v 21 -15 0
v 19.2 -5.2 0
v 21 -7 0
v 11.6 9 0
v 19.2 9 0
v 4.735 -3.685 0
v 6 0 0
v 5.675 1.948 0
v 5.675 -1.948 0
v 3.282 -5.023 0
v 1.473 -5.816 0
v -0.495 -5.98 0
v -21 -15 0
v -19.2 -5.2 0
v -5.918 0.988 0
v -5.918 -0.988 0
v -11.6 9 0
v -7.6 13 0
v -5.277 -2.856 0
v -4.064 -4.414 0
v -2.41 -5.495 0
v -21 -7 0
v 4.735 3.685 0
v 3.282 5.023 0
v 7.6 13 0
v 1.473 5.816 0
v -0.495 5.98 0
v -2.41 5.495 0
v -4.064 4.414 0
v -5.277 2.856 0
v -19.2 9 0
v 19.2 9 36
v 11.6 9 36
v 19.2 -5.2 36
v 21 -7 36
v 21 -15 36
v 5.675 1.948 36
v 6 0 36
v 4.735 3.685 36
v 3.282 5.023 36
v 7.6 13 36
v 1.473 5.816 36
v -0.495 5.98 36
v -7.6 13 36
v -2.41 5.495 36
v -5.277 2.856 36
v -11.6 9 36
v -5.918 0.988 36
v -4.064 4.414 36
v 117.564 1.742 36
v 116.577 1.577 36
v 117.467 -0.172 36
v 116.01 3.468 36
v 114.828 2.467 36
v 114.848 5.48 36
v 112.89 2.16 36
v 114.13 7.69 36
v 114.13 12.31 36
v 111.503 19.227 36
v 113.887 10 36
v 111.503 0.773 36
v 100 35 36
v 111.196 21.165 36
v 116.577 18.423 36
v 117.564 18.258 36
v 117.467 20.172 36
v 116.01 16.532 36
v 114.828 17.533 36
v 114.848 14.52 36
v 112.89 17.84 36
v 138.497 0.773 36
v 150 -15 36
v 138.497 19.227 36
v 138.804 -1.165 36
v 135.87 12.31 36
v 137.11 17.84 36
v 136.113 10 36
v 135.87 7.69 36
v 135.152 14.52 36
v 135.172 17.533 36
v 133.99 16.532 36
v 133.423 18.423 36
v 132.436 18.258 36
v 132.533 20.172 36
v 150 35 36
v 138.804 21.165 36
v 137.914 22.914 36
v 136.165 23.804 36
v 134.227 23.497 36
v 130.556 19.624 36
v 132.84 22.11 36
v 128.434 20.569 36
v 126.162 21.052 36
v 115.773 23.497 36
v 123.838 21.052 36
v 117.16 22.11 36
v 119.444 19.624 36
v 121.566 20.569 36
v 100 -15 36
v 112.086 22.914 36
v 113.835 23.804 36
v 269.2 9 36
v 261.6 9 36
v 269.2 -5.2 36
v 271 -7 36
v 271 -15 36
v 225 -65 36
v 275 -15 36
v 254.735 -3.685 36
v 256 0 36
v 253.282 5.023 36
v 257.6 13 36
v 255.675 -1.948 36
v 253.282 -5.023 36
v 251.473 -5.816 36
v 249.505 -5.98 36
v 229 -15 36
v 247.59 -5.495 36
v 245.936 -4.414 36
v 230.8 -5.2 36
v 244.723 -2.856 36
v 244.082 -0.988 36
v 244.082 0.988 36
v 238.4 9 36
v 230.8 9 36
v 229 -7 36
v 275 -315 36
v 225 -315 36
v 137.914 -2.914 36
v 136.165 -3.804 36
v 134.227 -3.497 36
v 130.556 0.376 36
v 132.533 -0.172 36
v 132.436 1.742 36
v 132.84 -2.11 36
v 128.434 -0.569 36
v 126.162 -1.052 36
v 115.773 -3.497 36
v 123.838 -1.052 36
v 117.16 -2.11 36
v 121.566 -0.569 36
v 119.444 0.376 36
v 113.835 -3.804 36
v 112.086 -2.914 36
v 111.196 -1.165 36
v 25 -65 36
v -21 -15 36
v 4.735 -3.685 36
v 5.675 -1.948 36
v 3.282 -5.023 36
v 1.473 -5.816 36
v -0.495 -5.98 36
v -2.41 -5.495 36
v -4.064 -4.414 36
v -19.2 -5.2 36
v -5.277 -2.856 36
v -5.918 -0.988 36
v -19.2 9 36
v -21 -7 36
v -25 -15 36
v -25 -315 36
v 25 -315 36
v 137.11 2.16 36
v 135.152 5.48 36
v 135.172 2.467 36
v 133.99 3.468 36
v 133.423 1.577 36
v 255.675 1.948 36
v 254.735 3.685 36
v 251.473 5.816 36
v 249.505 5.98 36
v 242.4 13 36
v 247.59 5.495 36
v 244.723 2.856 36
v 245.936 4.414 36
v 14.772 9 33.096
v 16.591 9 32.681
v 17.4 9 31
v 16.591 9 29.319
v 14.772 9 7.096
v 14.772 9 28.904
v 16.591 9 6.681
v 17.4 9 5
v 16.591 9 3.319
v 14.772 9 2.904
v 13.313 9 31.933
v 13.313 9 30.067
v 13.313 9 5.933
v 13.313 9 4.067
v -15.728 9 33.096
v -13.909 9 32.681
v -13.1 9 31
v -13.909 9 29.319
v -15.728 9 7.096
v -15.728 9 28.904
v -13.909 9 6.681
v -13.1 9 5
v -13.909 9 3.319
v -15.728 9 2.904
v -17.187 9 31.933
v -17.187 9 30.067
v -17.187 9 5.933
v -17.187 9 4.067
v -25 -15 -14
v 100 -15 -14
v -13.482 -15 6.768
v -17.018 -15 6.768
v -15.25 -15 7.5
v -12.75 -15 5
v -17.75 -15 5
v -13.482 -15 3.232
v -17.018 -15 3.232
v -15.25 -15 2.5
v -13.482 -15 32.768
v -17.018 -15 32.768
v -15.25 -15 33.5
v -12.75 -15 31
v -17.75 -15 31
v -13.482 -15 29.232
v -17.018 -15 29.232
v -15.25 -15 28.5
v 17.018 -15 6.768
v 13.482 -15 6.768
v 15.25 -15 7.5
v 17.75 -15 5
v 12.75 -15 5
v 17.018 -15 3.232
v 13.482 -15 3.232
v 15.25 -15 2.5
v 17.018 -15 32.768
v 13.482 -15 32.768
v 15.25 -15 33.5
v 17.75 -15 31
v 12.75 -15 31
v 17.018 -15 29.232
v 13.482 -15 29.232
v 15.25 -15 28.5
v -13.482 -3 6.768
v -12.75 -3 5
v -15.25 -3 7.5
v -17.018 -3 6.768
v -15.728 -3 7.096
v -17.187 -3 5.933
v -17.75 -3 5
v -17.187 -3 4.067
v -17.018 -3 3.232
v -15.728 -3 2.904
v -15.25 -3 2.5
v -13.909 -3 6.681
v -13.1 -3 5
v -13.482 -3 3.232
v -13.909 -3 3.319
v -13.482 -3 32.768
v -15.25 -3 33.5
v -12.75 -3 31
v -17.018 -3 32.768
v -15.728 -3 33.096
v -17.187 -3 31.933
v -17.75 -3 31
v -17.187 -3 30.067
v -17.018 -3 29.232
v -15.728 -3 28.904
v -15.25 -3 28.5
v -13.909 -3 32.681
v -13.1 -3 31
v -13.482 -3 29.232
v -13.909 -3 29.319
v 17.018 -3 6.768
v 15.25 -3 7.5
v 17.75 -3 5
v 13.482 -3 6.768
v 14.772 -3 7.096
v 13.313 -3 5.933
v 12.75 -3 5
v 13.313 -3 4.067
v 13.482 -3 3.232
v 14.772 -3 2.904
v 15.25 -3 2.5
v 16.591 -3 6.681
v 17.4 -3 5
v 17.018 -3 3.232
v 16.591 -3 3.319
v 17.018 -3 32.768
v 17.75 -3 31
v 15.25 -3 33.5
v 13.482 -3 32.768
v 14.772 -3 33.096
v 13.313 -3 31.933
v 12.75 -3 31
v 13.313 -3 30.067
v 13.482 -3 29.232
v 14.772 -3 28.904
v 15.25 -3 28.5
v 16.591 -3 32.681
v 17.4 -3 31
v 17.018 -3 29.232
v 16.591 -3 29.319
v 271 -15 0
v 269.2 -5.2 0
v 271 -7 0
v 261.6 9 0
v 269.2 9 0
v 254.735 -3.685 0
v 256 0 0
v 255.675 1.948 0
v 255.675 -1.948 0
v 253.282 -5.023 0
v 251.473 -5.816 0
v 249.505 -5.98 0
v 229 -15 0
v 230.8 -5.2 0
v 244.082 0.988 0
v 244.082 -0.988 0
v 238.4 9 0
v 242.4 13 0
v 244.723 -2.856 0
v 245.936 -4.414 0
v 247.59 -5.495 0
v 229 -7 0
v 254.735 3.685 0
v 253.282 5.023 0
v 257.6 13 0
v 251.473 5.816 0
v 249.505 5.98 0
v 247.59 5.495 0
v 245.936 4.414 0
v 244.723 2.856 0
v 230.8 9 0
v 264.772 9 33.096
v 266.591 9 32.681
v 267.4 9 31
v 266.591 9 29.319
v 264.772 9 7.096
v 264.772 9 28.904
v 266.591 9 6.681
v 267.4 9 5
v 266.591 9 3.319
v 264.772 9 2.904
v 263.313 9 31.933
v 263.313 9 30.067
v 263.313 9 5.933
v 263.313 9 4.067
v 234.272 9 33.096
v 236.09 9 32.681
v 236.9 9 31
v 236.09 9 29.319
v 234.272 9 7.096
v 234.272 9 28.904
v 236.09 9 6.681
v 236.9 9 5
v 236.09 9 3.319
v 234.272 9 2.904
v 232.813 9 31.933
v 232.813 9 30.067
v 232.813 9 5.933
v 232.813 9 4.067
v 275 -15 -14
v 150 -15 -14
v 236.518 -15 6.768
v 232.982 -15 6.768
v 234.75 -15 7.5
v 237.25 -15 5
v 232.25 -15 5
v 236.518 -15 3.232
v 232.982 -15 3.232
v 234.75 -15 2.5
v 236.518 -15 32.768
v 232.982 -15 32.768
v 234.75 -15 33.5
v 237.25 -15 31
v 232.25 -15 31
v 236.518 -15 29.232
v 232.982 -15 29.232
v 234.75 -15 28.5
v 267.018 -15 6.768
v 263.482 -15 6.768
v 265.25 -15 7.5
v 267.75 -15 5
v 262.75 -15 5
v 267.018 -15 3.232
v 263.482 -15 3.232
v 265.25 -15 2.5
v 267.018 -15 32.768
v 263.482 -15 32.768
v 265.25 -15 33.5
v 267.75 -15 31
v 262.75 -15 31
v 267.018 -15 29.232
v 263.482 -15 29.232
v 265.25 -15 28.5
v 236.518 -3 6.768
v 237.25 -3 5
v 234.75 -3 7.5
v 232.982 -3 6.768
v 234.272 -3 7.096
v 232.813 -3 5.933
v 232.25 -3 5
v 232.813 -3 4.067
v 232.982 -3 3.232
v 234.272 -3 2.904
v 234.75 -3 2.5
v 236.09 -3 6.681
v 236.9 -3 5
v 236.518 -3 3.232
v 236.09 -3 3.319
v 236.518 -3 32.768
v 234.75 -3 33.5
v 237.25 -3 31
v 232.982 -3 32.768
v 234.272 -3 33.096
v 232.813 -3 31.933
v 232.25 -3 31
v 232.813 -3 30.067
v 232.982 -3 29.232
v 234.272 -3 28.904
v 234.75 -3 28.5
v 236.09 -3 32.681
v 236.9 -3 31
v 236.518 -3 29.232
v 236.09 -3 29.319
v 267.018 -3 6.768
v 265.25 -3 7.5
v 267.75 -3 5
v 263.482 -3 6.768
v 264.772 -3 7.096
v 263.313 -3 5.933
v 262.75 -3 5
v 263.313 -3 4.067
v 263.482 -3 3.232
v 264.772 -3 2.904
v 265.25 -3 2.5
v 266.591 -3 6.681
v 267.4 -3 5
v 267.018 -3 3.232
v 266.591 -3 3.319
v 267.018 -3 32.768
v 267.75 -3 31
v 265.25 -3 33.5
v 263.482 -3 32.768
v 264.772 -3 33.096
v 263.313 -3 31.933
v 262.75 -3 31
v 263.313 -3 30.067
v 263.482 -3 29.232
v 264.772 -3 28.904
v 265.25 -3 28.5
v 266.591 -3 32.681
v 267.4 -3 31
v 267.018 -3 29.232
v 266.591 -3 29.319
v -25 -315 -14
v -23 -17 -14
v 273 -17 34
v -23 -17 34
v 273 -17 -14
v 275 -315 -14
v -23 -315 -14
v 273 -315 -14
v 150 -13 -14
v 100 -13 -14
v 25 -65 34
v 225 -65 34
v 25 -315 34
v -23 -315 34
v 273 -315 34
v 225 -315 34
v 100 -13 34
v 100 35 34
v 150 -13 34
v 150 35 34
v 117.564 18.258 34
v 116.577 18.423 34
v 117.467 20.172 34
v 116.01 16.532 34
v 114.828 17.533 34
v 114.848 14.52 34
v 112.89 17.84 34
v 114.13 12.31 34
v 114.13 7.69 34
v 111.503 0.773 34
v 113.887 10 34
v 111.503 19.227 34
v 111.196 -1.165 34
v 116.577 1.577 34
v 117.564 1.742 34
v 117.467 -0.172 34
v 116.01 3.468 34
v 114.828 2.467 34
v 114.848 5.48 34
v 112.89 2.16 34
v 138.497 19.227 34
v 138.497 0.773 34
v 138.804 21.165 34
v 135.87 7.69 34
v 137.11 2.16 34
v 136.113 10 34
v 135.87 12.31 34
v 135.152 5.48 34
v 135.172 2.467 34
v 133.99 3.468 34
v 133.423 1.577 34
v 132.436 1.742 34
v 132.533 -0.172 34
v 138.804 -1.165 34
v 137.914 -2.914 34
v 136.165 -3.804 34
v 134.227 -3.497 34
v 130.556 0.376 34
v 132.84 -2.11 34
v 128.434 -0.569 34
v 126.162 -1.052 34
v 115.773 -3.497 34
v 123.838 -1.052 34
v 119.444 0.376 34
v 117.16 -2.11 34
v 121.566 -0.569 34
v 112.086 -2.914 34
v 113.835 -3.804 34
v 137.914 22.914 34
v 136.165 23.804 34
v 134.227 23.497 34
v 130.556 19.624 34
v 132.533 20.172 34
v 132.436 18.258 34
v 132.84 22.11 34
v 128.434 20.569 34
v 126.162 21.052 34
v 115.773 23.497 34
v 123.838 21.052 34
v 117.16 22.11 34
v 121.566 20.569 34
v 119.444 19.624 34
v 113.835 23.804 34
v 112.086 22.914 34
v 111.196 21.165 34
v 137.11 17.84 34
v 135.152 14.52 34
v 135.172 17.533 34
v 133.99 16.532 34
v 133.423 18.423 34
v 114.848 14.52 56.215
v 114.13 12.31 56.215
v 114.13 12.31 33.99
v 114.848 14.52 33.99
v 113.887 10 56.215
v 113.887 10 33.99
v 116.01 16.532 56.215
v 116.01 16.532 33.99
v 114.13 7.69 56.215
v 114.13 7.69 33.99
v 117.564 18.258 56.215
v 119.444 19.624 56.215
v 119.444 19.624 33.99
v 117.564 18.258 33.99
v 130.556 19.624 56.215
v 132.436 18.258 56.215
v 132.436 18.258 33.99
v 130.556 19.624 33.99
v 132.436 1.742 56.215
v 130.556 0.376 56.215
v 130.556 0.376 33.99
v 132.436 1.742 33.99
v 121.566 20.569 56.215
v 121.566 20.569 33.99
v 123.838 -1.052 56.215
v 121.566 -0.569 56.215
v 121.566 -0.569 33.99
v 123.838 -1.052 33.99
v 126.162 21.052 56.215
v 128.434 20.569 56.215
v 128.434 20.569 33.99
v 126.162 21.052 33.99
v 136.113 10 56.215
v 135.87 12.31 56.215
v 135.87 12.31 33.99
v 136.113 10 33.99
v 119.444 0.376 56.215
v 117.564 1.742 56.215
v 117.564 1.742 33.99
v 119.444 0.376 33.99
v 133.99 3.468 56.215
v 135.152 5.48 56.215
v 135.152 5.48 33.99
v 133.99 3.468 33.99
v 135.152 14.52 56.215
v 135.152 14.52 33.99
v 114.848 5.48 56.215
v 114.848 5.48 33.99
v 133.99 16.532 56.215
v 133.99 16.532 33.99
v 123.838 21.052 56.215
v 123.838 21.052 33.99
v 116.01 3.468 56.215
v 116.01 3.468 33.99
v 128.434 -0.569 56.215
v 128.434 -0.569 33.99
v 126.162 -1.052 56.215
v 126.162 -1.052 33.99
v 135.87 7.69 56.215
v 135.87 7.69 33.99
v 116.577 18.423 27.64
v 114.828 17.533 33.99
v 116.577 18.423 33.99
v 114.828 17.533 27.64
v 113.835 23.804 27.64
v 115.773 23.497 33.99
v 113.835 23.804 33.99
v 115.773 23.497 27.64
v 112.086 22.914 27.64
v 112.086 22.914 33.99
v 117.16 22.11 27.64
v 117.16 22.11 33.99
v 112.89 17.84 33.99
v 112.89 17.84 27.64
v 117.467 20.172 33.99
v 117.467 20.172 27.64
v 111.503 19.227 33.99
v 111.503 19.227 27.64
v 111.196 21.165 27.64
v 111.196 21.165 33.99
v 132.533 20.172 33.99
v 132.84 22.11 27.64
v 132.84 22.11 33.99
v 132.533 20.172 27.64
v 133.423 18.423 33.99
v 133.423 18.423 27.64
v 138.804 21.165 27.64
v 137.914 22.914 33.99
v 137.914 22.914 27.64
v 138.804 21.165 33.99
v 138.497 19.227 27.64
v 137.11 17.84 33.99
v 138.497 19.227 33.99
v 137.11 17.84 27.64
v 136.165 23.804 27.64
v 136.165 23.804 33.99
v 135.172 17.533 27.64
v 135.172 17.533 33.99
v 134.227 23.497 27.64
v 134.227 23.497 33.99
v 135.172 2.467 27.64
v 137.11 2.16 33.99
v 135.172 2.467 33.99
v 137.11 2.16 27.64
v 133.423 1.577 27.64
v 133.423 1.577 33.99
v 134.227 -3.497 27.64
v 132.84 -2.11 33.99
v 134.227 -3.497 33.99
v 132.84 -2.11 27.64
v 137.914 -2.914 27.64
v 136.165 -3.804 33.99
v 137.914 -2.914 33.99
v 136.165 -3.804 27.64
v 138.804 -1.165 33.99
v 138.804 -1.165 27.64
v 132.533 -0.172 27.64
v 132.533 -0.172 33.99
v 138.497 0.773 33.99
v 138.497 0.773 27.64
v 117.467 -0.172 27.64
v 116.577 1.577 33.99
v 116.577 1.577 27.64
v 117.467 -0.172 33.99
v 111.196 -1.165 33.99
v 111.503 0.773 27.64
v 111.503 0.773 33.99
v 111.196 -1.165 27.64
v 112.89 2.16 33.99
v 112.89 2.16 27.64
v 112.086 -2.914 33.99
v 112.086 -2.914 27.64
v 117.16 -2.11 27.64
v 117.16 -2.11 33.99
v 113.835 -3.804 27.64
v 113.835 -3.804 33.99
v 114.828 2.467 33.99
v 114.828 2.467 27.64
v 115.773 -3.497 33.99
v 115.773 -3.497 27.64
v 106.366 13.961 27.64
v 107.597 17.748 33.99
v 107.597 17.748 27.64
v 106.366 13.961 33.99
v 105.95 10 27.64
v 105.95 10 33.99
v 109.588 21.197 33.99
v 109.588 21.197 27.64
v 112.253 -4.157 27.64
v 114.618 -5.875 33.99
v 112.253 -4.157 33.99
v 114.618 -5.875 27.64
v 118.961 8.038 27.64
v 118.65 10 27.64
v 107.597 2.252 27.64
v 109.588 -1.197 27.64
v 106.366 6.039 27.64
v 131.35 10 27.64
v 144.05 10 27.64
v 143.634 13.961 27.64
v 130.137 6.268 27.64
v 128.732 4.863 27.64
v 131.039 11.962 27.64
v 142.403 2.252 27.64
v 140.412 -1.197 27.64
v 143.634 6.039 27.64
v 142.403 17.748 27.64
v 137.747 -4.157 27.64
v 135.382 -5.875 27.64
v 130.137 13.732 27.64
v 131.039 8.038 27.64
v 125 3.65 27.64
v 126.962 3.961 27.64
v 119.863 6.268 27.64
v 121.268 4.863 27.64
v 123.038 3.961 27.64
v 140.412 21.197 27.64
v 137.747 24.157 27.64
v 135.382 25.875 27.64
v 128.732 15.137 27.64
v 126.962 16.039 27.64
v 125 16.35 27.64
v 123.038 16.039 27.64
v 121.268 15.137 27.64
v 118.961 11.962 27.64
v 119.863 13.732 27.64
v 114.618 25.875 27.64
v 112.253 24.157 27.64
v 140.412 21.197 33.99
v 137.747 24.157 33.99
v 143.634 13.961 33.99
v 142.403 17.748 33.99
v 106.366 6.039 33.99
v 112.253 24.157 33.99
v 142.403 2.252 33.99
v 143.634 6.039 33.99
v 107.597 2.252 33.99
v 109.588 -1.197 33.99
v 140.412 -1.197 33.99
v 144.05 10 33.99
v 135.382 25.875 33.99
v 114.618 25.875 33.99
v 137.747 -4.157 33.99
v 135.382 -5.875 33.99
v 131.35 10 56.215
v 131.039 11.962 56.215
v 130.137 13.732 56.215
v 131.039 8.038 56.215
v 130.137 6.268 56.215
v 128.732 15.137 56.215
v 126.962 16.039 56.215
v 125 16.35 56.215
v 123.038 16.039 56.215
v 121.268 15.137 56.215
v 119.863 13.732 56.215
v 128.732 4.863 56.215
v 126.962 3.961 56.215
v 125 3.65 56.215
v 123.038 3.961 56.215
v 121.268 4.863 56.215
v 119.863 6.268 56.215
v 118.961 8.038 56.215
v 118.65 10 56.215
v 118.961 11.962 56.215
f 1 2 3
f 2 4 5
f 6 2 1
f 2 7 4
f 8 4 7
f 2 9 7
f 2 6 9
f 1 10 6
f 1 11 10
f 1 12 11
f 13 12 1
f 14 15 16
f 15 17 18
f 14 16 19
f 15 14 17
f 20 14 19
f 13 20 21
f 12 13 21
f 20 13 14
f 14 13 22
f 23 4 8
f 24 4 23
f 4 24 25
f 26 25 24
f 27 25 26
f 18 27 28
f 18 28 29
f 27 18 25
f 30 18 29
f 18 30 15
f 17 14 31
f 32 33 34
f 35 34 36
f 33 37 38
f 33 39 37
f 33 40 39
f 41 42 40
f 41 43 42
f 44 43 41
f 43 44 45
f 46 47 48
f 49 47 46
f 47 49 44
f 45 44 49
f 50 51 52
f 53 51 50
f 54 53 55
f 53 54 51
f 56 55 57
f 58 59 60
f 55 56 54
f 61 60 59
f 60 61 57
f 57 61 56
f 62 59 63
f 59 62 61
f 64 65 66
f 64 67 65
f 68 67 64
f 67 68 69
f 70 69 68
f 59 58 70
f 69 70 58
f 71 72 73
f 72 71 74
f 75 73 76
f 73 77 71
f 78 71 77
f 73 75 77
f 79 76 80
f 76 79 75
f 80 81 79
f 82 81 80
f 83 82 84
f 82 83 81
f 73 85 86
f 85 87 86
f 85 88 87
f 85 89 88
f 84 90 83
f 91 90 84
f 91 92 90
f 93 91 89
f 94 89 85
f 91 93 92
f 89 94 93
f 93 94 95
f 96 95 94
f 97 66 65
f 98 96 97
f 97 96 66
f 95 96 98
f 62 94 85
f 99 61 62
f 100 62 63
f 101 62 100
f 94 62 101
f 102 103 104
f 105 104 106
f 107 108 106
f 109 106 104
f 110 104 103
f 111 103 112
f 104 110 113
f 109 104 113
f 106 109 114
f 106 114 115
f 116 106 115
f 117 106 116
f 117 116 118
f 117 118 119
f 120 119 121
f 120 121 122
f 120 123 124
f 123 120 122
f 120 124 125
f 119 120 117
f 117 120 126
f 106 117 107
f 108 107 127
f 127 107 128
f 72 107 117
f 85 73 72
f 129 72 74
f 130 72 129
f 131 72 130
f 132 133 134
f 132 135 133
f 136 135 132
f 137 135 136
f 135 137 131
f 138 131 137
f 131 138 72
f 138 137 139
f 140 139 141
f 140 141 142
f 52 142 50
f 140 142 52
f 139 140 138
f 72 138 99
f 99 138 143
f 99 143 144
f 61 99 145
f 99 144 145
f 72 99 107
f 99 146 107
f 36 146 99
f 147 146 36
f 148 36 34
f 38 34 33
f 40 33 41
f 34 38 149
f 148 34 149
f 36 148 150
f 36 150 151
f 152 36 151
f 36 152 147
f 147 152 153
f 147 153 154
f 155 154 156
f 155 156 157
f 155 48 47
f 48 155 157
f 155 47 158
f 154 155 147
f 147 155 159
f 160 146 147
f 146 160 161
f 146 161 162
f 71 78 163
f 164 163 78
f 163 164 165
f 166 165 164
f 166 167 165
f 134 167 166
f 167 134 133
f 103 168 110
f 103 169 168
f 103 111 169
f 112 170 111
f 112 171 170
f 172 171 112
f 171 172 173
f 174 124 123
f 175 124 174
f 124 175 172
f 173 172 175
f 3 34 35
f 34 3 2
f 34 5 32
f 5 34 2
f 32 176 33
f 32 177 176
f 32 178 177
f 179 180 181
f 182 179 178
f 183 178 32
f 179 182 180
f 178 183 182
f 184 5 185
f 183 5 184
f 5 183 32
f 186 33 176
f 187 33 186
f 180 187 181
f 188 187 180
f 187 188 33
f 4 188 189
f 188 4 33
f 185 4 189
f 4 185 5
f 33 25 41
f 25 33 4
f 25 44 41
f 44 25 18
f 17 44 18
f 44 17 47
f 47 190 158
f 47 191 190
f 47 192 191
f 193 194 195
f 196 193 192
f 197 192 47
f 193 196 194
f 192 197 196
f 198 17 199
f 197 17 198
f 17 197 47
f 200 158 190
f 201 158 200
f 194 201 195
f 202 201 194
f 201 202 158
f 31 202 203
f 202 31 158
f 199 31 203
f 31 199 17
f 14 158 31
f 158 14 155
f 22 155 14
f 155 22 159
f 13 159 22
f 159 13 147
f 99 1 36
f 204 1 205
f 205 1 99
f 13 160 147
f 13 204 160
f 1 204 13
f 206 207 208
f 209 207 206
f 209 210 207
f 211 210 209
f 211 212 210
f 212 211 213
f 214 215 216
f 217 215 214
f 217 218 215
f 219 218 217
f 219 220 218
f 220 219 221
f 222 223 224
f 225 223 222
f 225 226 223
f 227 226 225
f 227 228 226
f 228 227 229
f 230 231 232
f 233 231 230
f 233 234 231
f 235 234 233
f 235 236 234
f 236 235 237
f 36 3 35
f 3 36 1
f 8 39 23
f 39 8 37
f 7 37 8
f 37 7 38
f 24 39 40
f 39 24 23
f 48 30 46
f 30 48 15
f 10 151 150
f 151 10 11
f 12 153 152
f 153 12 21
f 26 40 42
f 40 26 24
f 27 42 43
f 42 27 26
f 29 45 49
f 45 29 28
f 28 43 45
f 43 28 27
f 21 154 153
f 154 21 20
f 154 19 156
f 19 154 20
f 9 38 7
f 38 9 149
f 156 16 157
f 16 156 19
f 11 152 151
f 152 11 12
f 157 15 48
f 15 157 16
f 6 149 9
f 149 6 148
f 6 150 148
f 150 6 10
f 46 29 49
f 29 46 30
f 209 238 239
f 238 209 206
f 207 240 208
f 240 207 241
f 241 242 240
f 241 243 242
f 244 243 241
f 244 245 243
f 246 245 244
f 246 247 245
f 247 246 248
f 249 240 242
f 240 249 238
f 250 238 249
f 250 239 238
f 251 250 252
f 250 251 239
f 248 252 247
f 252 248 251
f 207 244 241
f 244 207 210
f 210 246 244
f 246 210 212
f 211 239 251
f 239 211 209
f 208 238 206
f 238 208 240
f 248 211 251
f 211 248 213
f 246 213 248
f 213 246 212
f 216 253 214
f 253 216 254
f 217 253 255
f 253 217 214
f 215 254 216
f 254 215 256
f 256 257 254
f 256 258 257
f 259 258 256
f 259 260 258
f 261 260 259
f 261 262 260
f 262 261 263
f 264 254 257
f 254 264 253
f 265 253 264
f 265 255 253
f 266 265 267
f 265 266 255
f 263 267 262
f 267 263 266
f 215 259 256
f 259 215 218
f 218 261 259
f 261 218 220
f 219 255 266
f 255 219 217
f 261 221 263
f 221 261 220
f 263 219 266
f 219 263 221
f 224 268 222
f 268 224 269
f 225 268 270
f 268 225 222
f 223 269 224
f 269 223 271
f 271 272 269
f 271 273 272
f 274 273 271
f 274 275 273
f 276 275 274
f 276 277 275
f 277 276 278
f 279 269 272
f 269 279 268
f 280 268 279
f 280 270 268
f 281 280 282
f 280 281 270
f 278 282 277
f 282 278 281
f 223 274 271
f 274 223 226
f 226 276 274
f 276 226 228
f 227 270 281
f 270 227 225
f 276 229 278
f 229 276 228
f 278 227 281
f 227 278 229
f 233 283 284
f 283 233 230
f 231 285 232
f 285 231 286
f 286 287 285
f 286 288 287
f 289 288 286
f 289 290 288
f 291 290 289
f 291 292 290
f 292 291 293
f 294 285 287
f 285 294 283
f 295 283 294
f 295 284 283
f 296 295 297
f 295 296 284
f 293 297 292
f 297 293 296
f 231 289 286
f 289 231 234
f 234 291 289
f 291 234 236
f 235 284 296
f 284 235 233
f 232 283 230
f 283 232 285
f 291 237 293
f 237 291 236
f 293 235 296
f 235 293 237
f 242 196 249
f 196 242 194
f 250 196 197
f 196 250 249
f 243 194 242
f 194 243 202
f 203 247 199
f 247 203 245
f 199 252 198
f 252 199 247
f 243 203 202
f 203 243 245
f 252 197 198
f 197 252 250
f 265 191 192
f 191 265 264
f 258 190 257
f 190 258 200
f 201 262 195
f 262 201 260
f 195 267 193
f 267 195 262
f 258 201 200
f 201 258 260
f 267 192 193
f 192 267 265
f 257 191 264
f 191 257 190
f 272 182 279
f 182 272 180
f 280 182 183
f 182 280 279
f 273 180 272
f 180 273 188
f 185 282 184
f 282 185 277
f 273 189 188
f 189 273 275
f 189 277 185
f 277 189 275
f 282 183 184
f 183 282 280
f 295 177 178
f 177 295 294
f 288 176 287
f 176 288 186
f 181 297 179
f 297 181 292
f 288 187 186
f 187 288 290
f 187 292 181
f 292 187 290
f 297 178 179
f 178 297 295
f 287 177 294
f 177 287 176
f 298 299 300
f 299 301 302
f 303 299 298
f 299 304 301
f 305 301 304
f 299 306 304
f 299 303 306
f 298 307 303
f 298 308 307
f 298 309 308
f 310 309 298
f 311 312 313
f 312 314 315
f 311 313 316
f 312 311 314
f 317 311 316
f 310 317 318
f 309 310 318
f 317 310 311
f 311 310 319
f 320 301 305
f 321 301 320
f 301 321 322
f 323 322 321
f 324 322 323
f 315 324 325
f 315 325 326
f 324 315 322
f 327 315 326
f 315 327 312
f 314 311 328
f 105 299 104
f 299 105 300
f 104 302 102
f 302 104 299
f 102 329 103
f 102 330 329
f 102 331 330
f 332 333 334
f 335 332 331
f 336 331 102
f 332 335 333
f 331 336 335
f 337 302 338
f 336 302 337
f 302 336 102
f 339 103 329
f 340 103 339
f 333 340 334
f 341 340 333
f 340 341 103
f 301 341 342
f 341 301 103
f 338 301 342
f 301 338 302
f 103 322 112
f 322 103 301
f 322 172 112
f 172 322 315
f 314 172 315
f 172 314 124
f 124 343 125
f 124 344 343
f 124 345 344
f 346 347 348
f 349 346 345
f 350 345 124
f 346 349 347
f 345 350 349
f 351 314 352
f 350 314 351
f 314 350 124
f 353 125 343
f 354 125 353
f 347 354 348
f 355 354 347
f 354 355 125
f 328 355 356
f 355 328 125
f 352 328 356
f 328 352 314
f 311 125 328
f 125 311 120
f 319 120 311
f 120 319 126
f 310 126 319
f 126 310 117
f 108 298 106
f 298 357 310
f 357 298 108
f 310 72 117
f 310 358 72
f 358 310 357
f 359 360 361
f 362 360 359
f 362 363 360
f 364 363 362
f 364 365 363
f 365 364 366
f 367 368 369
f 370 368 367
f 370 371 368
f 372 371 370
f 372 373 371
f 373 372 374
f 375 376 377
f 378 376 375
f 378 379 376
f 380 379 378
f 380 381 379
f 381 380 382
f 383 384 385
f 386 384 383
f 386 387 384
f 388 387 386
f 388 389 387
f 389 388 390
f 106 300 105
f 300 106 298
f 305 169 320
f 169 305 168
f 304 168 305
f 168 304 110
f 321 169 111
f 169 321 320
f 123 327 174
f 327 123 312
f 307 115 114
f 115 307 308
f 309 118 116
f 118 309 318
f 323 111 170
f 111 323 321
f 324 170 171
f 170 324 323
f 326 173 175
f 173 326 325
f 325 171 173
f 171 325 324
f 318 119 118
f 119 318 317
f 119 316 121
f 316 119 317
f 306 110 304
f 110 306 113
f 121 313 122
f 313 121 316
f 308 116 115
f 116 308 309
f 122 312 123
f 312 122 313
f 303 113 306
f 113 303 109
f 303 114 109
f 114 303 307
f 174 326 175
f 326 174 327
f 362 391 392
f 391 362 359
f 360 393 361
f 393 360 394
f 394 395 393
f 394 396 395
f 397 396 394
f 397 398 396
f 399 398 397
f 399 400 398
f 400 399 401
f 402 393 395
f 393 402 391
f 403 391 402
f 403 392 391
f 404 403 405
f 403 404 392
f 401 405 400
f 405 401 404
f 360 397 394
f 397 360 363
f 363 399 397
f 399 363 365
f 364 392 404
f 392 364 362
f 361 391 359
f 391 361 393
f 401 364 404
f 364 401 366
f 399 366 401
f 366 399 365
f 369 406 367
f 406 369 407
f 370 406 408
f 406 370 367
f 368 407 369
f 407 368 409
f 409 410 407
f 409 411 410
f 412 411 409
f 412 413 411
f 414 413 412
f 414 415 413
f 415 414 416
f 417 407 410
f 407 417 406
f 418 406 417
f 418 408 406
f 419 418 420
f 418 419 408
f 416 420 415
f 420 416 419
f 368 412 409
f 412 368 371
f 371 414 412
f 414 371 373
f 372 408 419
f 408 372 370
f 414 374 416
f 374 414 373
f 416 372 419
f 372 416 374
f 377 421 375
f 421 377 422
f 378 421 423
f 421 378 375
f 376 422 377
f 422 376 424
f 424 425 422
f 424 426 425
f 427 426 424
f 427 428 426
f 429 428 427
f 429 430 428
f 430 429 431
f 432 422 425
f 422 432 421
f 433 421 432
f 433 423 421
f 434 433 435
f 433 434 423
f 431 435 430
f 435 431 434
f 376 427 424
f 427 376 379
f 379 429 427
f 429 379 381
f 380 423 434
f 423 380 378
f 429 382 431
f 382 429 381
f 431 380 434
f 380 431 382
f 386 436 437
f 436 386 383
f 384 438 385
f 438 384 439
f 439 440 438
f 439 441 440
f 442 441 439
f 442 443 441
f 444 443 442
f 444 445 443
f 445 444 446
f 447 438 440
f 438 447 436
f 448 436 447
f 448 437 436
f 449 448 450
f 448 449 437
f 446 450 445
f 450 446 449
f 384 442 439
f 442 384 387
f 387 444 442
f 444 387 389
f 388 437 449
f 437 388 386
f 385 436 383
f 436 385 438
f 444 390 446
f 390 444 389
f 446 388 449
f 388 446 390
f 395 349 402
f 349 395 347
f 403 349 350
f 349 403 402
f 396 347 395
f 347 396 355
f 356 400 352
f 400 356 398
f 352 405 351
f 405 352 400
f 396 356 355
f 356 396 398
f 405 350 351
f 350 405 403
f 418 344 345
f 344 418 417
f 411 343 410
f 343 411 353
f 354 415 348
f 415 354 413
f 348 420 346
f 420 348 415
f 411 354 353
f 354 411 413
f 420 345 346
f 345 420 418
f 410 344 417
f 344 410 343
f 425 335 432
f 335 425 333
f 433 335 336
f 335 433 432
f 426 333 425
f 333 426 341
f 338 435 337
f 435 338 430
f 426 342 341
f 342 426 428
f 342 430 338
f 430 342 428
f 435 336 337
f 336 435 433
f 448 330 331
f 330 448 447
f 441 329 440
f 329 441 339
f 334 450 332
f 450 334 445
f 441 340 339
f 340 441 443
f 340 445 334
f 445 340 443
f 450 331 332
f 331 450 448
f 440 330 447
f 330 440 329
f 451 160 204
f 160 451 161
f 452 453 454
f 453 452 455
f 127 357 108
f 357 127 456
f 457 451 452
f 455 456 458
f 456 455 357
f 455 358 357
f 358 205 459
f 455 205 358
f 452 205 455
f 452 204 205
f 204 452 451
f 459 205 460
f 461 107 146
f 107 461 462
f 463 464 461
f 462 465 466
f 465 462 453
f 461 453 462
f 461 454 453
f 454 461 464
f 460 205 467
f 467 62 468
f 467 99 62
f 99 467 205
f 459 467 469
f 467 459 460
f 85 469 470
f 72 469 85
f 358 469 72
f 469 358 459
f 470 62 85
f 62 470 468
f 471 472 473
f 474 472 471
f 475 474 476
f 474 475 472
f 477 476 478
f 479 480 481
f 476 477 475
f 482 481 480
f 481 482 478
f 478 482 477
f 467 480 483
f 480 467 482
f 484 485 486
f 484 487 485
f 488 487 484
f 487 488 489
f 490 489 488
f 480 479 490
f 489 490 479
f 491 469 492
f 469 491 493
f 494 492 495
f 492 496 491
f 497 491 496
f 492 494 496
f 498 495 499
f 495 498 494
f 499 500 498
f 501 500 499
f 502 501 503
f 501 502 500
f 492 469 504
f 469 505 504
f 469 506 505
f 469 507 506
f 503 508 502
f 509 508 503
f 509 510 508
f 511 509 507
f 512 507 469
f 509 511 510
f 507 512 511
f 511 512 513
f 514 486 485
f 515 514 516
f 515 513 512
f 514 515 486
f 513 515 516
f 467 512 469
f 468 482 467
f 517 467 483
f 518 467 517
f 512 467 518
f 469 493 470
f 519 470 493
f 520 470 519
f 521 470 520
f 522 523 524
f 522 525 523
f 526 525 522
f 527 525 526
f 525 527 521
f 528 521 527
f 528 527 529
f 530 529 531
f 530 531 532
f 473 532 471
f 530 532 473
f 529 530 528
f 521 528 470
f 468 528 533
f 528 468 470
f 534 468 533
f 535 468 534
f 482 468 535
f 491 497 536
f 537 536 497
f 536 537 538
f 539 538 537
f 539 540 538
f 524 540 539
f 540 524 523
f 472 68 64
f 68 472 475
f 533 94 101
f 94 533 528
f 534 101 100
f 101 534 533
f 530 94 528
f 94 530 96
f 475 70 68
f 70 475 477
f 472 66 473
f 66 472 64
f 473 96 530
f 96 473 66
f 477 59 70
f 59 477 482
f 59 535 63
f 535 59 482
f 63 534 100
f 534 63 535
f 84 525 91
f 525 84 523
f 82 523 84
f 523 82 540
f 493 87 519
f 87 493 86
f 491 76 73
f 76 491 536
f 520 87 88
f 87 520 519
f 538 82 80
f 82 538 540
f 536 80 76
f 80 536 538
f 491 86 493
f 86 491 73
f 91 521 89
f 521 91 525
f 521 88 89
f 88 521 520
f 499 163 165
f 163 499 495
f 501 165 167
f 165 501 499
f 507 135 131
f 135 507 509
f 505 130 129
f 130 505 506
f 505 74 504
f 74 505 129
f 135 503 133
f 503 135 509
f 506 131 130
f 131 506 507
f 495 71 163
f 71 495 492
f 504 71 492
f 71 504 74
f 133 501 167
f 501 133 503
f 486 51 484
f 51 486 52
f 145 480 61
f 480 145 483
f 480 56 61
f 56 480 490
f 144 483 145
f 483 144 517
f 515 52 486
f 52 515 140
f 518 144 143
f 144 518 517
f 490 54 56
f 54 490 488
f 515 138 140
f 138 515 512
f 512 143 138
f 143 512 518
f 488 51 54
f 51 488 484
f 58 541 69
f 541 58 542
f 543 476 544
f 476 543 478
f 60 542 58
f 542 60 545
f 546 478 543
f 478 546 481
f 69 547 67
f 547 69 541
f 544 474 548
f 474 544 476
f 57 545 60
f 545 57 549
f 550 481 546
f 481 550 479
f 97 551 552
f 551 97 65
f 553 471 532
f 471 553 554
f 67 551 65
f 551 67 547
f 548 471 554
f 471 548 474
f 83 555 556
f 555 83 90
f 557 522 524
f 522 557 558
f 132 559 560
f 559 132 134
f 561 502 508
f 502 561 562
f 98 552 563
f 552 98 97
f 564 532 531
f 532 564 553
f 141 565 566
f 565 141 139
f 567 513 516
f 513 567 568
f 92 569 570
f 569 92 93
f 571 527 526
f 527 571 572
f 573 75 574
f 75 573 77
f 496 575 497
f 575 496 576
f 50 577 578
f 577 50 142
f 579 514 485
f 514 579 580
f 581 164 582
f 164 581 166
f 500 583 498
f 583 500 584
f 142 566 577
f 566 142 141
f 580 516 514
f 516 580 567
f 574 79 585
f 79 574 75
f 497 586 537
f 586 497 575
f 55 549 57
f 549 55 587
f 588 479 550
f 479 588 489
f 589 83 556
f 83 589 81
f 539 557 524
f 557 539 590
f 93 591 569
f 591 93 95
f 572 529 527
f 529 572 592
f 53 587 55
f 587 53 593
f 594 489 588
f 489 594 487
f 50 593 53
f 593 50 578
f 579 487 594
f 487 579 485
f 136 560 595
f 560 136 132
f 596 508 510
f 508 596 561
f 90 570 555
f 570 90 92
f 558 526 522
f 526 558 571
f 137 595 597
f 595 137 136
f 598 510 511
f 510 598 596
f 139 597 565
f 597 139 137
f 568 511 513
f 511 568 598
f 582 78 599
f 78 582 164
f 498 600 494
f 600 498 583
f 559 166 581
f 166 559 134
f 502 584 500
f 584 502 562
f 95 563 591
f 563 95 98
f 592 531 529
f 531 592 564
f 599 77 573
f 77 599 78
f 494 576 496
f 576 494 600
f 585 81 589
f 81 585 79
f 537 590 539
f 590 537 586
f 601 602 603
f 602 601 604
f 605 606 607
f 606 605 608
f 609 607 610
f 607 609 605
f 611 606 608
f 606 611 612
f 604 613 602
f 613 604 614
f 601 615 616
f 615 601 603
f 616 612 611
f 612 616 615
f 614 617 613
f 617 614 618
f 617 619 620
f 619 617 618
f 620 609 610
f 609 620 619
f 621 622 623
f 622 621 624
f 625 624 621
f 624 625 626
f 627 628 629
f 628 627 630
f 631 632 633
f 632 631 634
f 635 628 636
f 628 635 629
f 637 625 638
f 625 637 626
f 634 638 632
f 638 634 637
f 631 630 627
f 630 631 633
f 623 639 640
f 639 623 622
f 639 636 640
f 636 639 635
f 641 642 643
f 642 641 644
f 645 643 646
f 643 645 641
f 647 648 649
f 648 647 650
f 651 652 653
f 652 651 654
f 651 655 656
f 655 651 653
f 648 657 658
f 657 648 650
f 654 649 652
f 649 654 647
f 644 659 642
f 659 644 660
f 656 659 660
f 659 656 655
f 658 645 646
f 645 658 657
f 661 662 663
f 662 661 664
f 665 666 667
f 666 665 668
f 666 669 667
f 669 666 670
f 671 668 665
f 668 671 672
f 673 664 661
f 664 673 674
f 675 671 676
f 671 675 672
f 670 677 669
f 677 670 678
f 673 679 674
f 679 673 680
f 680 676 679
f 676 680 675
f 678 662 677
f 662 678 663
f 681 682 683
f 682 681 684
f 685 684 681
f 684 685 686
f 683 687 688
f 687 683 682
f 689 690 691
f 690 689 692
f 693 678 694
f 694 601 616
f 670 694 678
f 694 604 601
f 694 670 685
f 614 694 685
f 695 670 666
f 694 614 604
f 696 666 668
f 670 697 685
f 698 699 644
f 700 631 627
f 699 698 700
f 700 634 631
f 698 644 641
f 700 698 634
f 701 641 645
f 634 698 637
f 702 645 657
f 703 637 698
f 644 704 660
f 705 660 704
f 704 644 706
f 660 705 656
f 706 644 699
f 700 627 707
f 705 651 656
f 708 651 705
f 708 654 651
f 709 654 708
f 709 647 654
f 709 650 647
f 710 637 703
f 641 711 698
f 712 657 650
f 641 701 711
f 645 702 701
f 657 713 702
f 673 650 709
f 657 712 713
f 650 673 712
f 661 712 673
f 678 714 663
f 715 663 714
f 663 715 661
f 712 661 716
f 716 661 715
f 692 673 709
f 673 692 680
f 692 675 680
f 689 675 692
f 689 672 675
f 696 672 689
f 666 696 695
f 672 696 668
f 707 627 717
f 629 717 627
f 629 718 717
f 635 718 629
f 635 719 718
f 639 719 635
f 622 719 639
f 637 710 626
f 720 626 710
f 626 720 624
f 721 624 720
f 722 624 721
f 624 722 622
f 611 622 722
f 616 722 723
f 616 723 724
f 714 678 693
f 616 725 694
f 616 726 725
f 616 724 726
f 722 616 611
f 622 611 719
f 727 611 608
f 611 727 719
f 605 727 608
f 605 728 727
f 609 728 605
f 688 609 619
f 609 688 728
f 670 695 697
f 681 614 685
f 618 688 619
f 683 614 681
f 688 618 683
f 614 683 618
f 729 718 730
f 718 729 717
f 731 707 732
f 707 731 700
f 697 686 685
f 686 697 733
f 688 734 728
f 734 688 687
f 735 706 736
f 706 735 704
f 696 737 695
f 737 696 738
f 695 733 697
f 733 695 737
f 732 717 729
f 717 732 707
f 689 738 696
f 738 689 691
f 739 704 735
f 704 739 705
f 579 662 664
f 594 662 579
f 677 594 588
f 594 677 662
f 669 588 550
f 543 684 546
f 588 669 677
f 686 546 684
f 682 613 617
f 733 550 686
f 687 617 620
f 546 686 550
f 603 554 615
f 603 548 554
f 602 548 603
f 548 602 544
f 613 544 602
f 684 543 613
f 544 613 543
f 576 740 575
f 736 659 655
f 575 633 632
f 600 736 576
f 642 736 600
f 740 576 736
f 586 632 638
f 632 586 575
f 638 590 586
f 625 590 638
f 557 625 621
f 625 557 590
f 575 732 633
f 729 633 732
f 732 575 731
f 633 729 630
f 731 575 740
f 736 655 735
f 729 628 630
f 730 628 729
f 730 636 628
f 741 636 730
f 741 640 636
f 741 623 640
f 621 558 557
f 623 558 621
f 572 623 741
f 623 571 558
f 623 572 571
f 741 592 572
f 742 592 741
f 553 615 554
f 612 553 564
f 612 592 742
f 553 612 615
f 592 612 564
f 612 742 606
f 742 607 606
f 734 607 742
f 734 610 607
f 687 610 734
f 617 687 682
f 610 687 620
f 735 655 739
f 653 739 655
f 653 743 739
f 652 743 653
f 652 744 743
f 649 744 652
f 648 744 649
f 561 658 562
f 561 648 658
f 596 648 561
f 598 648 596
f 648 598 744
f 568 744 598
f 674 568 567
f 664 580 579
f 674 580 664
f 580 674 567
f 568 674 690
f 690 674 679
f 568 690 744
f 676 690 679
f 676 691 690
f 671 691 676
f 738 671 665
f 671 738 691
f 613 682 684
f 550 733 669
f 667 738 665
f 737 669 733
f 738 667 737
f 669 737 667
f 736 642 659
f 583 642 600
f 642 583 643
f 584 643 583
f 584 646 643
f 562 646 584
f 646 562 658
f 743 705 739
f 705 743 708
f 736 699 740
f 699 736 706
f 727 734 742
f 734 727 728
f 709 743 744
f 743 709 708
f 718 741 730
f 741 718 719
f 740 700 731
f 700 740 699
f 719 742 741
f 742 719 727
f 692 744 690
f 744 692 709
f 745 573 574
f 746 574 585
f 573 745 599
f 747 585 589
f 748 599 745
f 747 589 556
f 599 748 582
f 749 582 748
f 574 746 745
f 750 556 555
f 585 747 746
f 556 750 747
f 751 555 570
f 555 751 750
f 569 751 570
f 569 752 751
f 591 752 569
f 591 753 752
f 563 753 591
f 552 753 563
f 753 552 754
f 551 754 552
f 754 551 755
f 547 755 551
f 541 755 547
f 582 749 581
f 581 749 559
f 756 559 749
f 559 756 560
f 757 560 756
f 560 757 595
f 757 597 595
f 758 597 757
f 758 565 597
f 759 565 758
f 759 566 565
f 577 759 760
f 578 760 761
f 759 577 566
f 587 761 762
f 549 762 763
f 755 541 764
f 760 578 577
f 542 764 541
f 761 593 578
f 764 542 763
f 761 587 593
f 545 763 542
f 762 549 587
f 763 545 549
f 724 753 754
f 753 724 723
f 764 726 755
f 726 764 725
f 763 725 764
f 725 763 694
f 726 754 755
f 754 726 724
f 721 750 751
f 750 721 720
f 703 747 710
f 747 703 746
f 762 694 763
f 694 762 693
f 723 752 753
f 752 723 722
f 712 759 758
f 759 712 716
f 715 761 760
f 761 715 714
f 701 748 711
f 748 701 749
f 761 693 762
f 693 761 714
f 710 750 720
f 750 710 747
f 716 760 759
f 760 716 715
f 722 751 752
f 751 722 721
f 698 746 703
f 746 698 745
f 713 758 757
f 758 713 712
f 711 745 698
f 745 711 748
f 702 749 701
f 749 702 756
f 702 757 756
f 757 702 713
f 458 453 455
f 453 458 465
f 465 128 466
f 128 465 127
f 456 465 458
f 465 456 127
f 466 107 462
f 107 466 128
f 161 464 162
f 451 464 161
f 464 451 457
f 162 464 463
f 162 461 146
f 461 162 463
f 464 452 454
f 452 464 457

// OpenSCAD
// file: bearing_dims.scad
/*
	bore = v[0];
	outer = v[1];
	len = v[2];
	ring_space = v[3];
	ring_dia = v[4];
	ring_gap = v[5];
*/

linear_bearing_dims = [
	[3,7,10,0,7,0],
	[4,8,12,0,8,0],
	[5,10,15,10.2,9.6,1.1],
	[6,12,19,13.5,11.5,1.1],
	[8,15,24,17.5,14.3,1.1],
	[10,19,29,22,18,1.3],
	[12,21,30,23,20,1.3],
	[13,23,32,23,22,1.3],
	[16,28,37,26.5,27,1.6],
	[20,32,42,30.5,30.5,1.6],
	[25,40,59,41,38,1.85],
	[30,45,64,44.5,43,1.85],
	[35,52,70,49.5,49,2.1],
	[40,60,80,60.5,57,2.1],
	[50,80,100,74,76.5,2.6],
	[60,90,110,85,86.5,3.15],
	[80,120,140,105.5,116,4.15],
	[100,150,150,125.5,145,4.15]
];

/*
	d = v[0];
	h = v[1];
	e = v[2];
	w = v[3];		// overall width
	l = v[4];		// overall length
	f = v[5];
	g = v[6];
	b = v[7];		// screw spacing along width
	c = v[8];		// screw spacing along length
	k = v[9];
	t = v[10];
	s1 = v[11];
	s2 = v[12];
	L1 = v[13];
*/

linear_bearing_block_dims = [
	[6,9,15,30,25,18,15,20,15,5,6,4,3.4,8],
	[8,11,17,34,30,22,18,24,18,5,6,4,3.4,8],
	[10,13,20,40,35,26,21,28,21,6,8,5,4.3,12],
	[12,15,21,42,36,28,24,30.5,26,5.75,8,5,4.3,12],
	[13,15,22,44,39,30,24.5,33,26,5.5,8,5,4.3,12],
	[16,19,25,50,44,38.5,32.5,36,34,7,9,5,4.3,12],
	[20,21,27,54,50,41,35,40,40,7,11,6,5.2,12],
	[25,26,38,76,67,51.5,42,54,50,11,12,8,7,18],
	[30,30,39,78,72,59.5,49,58,58,10,15,8,7,18],
	[35,34,45,90,80,68,54,70,60,10,18,8,7,18],
	[40,40,51,102,90,78,62,80,60,11,20,10,8.7,25],
	[50,52,61,122,110,102,80,100,80,11,25,10,8.7,25],
	[60,58,66,132,122,114,94,108,90,12,30,10,10.7,25]
];

linear_bearing_long_block_dims = [
	[8,11,17,34,59,22,18,24,42,5,6,4,3.4,8],
	[10,13,20,40,68,26,21,28,46,6,8,5,4.3,12],
	[12,15,21,42,70,28,24,30.5,50,5.75,8,5,4.3,12],
	[13,15,22,44,75,30,24.5,33,50,5.5,8,5,4.3,12],
	[16,19,25,50,85,38.5,32.5,36,60,7,9,5,4.3,12],
	[20,21,27,54,96,41,35,40,70,7,11,6,5.2,12],
	[25,26,38,76,130,51.5,42,54,100,11,12,8,7,18],
	[30,30,39,78,140,59.5,49,58,110,10,15,8,7,18],
	[35,34,45,90,155,68,54,70,120,10,18,8,7,18],
	[40,40,51,102,175,78,62,80,140,11,20,10,8.7,25],
];

/*
	d = v[0];
	D = v[1];
	L = v[2];
	D1 = v[3];
	H = v[4];
	pcd = v[5];
	d1 = v[6];
	d2 = v[7];
	h = v[8];
*/

linear_bearing_round_flange_dims = [
	[6,12,19,28,5,20,3.4,6.5,3.3],
	[8,15,24,32,5,24,3.4,6.5,3.3],
	[10,19,29,40,6,29,4.5,8,4.4],
	[12,21,30,42,6,32,4.5,8,4.4],
	[13,23,32,43,6,33,4.5,8,4.4],
	[16,28,37,48,6,38,4.5,8,4.4],
	[20,32,42,54,8,43,5.5,9.5,5.4],
	[25,40,59,62,8,51,5.5,9.5,5.4],
	[30,45,64,74,10,60,6.6,11,6.5],
	[35,52,70,82,10,67,6.6,11,6.5],
	[40,60,80,96,13,78,9,14,8.6],
	[50,80,100,116,13,98,9,14,8.6],
	[60,90,110,134,18,112,11,17.5,10.6]
];

function get_dims_for_shaft_size(shaft_size, dims) = 
	dims[search(shaft_size, dims, 1, 0)[0]];
// file: leadscrew.scad
module anti_backlash_nut()
{
	function mm(inch) = inch * 25.4;

	bore = mm(0.5);
	ht = mm(1.125);
	sm_d = mm(0.875);
	fl_d = mm(1.5);
	fl_w = mm(1.25);
	fl_ht = mm(0.25);
	mnt_cir_r = mm(1.188 / 2);
	mnt_d = mm(0.25);

	difference()
	{
		union()
		{
			cylinder(r=sm_d / 2, h = ht);
			intersection()
			{
				cylinder(r=fl_d / 2, h = fl_ht);
				translate([0,0,fl_ht / 2])
					cube([fl_d, fl_w, fl_ht], center=true);
			}
		}
		translate([0,0,-0.1])
			cylinder(r=bore / 2, h = ht + 0.2);
		for(a = [45,135,225,315])
		{
			rotate([0,0,a])
				translate([mnt_cir_r,0,-0.1])
					cylinder(r = mnt_d / 2, h = fl_ht + 0.2);
		}
	}	
}

anti_backlash_nut();
// file: linear_bearing_block.scad
include <bearing_dims.scad>;

module draw_linear_bearing_block(v)
{
	d = v[0];
	h = v[1];
	e = v[2];
	w = v[3];
	l = v[4];
	f = v[5];
	g = v[6];
	b = v[7];
	c = v[8];
	k = v[9];
	t = v[10];
	s1 = v[11];
	s2 = v[12];
	L1 = v[13];

	st = (k - (s2 / 2)) / 2;
	t1 = t + st;
	h1 = f - g;
	p1 = (w - (2 * h1 + 2 * st)) / 4;
	c1 = (l - c) / 2;

	translate([-w/2,0,h])
	rotate([90,180,180])
	difference()
	{
		linear_extrude(height=l)
			polygon(points=[
				[0,0],[w,0],[w,t],[w-st,t1],[w-st,g],
				[w-st-p1,g],[w-st-p1-h1,f],[st+p1+h1,f],
				[st+p1,g],[st,g],[st,t1],[0,t]],
				path=[0,1,2,3,4,5,6,7,8,9,10,11]);

		translate([e,h,-0.1])
			cylinder(r=d/2, h=l+0.2, center=false);

		translate([k,L1,c1]) rotate([90,0,0])
			cylinder(r=s1/2, h=L1+0.1, center=false);
		translate([k,L1,c+c1]) rotate([90,0,0])
			cylinder(r=s1/2, h=L1+0.1, center=false);
		translate([w-k,L1,c1]) rotate([90,0,0])
			cylinder(r=s1/2, h=L1+0.1, center=false);
		translate([w-k,L1,c+c1]) rotate([90,0,0])
			cylinder(r=s1/2, h=L1+0.1, center=false);

		translate([k,g+0.1,c1]) rotate([90,0,0])
			cylinder(r=s2/2, h=g+0.1, center=false);
		translate([k,g+0.1,c+c1]) rotate([90,0,0])
			cylinder(r=s2/2, h=g+0.1, center=false);
		translate([w-k,g+0.1,c1]) rotate([90,0,0])
			cylinder(r=s2/2, h=g+0.1, center=false);
		translate([w-k,g+0.1,c+c1]) rotate([90,0,0])
			cylinder(r=s2/2, h=g+0.1, center=false);
	}
}

module linear_bearing_mount_holes(dims, depth)
{
	w = dims[3];
	l = dims[4];
	c = dims[8];
	k = dims[9];
	s2 = dims[12];

	c1 = (l - c) / 2;

	translate([k,c1,0])
		cylinder(r=s2/2, h=depth, center=false);
	translate([k,c+c1,0])
		cylinder(r=s2/2, h=depth, center=false);
	translate([w-k,c1,0])
		cylinder(r=s2/2, h=depth, center=false);
	translate([w-k,c+c1,0])
		cylinder(r=s2/2, h=depth, center=false);

}

module linear_bearing_block(shaft_size)
{
	d = get_dims_for_shaft_size(shaft_size, linear_bearing_block_dims);
	draw_linear_bearing_block(d);
}

module linear_bearing_long_block(shaft_size)
{
	d = get_dims_for_shaft_size(shaft_size, linear_bearing_long_block_dims);
	draw_linear_bearing_block(d);
}

linear_bearing_block(10);
translate([50,0,0])
	linear_bearing_long_block(10);
// file: angle.scad
module angle(thickness, width, height, length)
{
	color([0.5,0.5,0.5])
	union()
	{
		cube([length,width,thickness]);
		cube([length,thickness,height]);
	}
}
// main file
use <angle.scad>;
use <linear_bearing_block.scad>;
use <leadscrew.scad>;
include <bearing_dims.scad>;

module platform(depth, width, z_bearing, z_sep)
{
	z_dims = get_dims_for_shaft_size(z_bearing, linear_bearing_block_dims);
	z_bb_ht = z_dims[1];
	z_bb_l = z_dims[4];

	rotate([90,0,0])
	union()
	{
		linear_bearing_block(12);
		translate([z_sep,0,0])
			linear_bearing_block(12);
		translate([width - (width - z_sep) / 2,z_bb_l,z_bb_ht])
			rotate([0,0,180])
				bed(depth, width);
	}
}

module bed(depth, width)
{
		angle(2,50,50,width);
		translate([(width - 50) / 2,0,0])
			mirror([0,0,1])
				drive_bracket();
		translate([0,0,depth])
			rotate([0,90,0])
				angle(2,50,50,depth);
		translate([width,0,depth])
			rotate([0,90,90])
				angle(2,50,50,depth);
}

module drive_bracket()
{
	function mm(inch) = inch * 25.4;

	bore = mm(0.5);
	ht = mm(1.125);
	sm_d = mm(0.875);
	fl_d = mm(1.5);
	fl_w = mm(1.25);
	fl_ht = mm(0.25);
	mnt_cir_r = mm(1.188 / 2);
	mnt_d = mm(0.25);

	union()
	{
		difference()
		{
			angle(2,50,50,50);
			translate([50 / 2, 2.1, 50 / 2])
				rotate([90,0,0])
				{
					cylinder(r=sm_d / 2, h = 2.2);
					for(a = [45,135,225,315])
					{
						rotate([0,0,a])
							translate([mnt_cir_r,0,-0.1])
								cylinder(r = mnt_d / 2, h = fl_ht + 0.2);
					}
				}
		}

		translate([50 / 2, fl_ht + 2.01, 50 / 2])
			rotate([90,0,0])
				anti_backlash_nut();
	}
}

//drive_bracket();
//bed(200,300);
platform(300, 300, 12, 250);
